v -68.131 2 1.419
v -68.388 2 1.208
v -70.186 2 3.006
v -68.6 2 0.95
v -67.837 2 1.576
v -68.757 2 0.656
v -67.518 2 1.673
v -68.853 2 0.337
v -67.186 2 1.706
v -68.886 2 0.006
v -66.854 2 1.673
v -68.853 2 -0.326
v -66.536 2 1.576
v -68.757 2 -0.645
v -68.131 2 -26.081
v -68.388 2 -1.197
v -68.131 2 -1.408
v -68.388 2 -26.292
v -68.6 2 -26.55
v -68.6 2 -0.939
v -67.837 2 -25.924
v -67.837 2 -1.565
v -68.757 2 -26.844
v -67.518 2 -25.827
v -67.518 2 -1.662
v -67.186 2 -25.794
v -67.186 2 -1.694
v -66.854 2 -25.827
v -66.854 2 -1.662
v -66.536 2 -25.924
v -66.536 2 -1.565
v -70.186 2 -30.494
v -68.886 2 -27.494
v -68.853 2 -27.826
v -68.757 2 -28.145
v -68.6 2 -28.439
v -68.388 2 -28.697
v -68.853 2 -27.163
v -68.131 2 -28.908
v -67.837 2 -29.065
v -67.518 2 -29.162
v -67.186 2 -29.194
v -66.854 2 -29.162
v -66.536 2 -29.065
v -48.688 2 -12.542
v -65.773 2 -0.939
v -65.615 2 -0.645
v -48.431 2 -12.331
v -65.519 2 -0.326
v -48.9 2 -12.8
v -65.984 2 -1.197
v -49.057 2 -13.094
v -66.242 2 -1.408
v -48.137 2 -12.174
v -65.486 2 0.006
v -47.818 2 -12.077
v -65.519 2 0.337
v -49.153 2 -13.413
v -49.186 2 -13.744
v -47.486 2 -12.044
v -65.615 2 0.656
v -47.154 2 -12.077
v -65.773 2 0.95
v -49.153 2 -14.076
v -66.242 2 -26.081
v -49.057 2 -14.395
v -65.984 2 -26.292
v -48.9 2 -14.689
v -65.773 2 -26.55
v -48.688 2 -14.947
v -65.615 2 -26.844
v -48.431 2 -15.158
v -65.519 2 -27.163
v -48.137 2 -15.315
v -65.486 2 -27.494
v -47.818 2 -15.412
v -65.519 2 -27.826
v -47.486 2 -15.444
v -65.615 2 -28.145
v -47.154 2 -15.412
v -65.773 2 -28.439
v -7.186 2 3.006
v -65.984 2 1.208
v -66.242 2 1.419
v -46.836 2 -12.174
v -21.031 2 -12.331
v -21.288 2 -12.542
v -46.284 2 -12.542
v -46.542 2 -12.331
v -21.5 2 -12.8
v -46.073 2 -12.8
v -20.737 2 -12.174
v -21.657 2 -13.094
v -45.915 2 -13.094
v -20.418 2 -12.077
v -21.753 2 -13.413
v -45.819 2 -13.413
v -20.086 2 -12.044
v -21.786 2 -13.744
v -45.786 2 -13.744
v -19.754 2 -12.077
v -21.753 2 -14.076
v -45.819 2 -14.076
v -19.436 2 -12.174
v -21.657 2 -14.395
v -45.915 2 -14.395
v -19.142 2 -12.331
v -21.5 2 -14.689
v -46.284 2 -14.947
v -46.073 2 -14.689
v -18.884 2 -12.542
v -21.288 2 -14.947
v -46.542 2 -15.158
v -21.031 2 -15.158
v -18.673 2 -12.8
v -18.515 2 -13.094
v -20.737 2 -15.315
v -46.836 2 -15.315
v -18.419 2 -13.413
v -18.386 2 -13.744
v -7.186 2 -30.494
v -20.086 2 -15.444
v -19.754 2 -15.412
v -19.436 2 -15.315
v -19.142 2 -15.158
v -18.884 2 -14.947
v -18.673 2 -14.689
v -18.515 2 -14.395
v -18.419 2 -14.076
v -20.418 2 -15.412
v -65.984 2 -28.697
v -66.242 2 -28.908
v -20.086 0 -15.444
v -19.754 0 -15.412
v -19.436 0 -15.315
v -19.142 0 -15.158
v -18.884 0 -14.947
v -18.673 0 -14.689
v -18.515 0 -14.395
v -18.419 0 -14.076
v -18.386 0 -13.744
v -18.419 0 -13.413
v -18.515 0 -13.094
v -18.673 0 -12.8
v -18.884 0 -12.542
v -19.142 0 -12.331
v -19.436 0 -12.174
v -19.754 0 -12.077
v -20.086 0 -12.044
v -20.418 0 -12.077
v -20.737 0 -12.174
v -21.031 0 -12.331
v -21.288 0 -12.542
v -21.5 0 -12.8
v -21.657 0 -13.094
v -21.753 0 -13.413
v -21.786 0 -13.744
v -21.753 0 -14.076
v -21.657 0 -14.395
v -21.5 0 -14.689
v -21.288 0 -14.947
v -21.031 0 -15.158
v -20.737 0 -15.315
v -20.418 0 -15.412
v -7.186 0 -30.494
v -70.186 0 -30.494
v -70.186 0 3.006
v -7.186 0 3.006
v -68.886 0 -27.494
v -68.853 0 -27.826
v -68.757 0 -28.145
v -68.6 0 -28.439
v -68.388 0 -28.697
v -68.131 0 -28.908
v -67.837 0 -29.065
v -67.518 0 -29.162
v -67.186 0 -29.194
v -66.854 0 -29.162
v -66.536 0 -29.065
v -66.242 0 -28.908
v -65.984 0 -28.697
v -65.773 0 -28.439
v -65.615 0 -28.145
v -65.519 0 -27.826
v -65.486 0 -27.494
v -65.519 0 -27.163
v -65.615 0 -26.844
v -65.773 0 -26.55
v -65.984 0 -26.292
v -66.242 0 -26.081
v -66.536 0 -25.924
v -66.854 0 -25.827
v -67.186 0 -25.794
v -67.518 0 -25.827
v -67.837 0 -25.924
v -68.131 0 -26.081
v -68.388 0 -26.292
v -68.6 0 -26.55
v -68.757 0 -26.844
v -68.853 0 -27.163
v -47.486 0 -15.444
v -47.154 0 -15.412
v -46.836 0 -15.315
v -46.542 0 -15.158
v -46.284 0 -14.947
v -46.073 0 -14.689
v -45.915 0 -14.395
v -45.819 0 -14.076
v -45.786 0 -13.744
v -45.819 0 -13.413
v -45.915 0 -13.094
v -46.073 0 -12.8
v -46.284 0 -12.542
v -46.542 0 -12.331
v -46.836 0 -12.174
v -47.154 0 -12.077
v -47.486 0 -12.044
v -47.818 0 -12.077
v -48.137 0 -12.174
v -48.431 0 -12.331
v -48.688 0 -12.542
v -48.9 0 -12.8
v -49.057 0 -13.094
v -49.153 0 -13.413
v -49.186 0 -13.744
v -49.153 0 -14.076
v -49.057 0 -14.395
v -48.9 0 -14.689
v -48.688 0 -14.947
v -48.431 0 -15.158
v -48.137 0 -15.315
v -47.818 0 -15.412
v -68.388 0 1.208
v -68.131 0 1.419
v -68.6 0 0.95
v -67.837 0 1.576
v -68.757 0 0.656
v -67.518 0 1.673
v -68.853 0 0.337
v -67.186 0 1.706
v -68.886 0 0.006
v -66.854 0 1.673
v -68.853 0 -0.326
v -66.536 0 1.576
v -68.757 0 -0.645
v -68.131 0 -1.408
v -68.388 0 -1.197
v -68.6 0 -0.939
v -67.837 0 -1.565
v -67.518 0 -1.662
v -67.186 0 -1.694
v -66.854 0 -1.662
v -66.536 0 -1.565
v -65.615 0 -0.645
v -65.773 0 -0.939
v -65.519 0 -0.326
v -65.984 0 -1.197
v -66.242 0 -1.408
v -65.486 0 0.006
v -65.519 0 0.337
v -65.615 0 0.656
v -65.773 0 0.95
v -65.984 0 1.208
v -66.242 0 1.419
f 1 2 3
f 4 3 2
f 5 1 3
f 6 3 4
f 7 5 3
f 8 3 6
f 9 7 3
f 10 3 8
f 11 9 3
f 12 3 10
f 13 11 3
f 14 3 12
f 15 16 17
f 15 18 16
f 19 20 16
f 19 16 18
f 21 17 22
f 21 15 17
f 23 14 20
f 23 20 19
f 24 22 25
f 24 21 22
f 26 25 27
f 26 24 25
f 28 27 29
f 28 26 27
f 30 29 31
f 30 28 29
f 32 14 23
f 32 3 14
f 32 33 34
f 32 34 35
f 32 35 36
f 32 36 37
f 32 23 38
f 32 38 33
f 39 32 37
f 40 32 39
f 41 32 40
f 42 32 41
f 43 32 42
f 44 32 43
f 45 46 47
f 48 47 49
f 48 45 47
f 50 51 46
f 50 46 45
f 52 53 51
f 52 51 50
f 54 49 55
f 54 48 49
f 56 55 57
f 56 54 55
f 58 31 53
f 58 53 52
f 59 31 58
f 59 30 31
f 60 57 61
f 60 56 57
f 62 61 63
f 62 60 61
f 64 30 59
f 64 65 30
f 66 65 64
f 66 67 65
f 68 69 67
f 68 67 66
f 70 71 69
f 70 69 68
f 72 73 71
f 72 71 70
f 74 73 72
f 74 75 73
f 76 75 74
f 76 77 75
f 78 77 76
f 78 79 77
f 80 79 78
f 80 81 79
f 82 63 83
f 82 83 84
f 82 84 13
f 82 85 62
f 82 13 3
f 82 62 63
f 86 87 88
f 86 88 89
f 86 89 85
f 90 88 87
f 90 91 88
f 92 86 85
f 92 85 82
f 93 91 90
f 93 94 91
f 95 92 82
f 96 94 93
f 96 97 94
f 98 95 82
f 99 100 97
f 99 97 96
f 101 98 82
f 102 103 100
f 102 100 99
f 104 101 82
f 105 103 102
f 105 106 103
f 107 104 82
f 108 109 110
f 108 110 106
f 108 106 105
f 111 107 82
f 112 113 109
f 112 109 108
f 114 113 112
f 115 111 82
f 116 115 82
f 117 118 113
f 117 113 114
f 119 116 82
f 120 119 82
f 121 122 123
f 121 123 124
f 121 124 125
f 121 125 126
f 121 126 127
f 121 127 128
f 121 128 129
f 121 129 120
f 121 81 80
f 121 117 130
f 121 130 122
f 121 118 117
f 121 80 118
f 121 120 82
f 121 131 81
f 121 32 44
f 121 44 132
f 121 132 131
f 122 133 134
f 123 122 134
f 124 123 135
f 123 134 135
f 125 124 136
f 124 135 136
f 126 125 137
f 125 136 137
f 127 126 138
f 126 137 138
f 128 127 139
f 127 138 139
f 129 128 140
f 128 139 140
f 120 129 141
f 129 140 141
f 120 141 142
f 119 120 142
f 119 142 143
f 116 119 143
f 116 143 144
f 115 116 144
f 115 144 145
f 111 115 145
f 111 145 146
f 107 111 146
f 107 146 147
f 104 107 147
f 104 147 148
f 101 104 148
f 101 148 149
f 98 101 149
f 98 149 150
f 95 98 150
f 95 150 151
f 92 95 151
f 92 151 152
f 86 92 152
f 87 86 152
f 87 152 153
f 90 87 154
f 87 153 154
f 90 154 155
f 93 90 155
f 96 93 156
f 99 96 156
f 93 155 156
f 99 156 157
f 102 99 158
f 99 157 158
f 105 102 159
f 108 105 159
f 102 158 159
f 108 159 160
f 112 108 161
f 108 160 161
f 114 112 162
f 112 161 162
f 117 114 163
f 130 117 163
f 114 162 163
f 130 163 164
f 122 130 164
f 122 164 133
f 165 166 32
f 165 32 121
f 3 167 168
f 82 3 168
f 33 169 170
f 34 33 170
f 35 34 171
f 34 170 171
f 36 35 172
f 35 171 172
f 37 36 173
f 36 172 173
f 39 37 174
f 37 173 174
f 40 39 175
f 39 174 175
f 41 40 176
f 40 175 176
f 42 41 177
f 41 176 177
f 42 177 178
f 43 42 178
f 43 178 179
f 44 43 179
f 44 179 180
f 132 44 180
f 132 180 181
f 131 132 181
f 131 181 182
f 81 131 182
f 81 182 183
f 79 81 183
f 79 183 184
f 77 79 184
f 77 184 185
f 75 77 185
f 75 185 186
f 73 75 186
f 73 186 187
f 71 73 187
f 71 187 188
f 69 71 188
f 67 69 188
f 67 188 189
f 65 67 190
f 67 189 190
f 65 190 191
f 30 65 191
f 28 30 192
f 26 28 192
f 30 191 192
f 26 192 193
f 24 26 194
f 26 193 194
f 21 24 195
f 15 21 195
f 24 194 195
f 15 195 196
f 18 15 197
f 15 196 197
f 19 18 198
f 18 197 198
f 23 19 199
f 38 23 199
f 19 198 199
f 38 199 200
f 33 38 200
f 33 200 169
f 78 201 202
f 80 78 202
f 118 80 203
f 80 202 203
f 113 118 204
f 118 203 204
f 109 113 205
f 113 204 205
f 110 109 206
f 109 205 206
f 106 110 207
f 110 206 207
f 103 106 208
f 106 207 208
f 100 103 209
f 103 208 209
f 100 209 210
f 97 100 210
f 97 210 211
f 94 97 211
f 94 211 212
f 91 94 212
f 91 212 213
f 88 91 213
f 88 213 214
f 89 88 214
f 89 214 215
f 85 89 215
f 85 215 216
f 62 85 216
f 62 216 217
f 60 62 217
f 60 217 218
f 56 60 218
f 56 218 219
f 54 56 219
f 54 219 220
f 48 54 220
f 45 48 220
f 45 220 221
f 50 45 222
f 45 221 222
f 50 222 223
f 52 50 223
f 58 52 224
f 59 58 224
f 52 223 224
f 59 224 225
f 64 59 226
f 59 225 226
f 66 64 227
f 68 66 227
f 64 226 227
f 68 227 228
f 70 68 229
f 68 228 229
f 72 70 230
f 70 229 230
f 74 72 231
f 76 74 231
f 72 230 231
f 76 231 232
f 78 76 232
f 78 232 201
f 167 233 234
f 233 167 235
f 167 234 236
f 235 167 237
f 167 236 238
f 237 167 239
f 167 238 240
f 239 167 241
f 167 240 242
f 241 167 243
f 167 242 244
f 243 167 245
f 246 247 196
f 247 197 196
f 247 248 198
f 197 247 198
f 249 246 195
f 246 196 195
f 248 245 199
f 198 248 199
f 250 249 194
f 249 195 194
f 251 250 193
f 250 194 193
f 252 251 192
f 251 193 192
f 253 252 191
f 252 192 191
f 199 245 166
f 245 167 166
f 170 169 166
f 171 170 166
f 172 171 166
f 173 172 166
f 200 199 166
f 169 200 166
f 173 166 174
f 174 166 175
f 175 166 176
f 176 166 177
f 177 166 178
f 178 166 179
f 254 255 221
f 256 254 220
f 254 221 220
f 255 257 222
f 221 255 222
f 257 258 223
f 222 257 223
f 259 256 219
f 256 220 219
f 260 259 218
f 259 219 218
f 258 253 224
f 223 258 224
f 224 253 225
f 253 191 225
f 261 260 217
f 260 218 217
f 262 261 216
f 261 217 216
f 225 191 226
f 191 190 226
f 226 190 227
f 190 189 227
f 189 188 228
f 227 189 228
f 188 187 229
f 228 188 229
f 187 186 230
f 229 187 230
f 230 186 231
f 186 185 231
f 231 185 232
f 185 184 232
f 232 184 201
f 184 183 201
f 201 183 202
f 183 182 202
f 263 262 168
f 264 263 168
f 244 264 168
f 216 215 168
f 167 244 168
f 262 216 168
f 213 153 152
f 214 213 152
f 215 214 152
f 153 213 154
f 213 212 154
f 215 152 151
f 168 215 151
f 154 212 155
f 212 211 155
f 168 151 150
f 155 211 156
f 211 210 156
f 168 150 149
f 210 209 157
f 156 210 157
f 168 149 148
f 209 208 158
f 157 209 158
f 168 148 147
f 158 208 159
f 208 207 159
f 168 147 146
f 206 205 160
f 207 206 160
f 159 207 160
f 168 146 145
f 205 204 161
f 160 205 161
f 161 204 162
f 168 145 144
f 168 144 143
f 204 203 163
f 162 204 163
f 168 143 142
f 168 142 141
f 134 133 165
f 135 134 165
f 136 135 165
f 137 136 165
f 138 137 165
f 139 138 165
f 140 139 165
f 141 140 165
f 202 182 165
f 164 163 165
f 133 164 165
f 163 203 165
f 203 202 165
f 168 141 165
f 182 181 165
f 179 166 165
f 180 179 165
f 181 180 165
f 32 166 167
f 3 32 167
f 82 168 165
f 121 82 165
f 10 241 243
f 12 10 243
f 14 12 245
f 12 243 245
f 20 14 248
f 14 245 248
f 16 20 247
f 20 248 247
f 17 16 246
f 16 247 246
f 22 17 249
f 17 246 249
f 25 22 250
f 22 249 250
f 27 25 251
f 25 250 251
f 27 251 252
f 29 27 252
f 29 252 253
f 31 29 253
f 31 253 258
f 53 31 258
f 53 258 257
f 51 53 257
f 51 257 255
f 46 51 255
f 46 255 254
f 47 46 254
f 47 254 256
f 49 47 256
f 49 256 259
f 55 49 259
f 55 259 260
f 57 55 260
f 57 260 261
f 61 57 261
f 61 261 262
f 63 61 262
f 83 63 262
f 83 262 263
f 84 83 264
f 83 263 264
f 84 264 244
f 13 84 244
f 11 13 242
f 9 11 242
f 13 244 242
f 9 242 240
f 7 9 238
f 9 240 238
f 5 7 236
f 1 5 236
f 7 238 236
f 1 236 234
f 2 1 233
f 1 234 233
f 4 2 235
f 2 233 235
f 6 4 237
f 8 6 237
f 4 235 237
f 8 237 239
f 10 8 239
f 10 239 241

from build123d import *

# Parameters (mm, degrees)
SKETCH1_W            = 65
SKETCH1_H            = 33.5
BOSS_EXTRUDE1_DEPTH  = 2
M3_CLEARANCE_HOLE1_D = 3.4
M3_CLEARANCE_HOLE2_D = 3.4
SKETCH6_W            = 2
SKETCH6_H            = 33.5
CUT_EXTRUDE1_DEPTH   = 3


with BuildPart() as part:
    # Sketch1 → Boss-Extrude1 (new body)
    with BuildSketch(Plane(origin=(0, 0, 0), x_dir=(1, 0, 0), z_dir=(0, 1, 0))):
        with Locations((-39.686085356, 13.7444519)):
            Rectangle(SKETCH1_W, SKETCH1_H)
    extrude(amount=BOSS_EXTRUDE1_DEPTH)

    # M3 Clearance Hole1 (through all)
    with Locations(Plane(origin=(0, 2, 0), x_dir=(1, 0, 0), z_dir=(0, 1, 0))):
        with Locations((-67.186085356, 27.4944519), (-67.186085356, -0.0055481)):
            Hole(M3_CLEARANCE_HOLE1_D / 2)

    # M3 Clearance Hole2 (through all)
    with Locations(Plane(origin=(-47.486085356, 2, -13.7444519), x_dir=(0, 0, 1), z_dir=(0, 1, 0))):
        with Locations((0, 0), (0, 27.4)):
            Hole(M3_CLEARANCE_HOLE2_D / 2)

    # Sketch6 → Cut-Extrude1 (cut, through all)
    with BuildSketch(Plane.XZ):
        with Locations((-71.186085356, -13.7444519)):
            Rectangle(SKETCH6_W, SKETCH6_H)
    extrude(amount=-CUT_EXTRUDE1_DEPTH, mode=Mode.SUBTRACT)


solid = part.part
